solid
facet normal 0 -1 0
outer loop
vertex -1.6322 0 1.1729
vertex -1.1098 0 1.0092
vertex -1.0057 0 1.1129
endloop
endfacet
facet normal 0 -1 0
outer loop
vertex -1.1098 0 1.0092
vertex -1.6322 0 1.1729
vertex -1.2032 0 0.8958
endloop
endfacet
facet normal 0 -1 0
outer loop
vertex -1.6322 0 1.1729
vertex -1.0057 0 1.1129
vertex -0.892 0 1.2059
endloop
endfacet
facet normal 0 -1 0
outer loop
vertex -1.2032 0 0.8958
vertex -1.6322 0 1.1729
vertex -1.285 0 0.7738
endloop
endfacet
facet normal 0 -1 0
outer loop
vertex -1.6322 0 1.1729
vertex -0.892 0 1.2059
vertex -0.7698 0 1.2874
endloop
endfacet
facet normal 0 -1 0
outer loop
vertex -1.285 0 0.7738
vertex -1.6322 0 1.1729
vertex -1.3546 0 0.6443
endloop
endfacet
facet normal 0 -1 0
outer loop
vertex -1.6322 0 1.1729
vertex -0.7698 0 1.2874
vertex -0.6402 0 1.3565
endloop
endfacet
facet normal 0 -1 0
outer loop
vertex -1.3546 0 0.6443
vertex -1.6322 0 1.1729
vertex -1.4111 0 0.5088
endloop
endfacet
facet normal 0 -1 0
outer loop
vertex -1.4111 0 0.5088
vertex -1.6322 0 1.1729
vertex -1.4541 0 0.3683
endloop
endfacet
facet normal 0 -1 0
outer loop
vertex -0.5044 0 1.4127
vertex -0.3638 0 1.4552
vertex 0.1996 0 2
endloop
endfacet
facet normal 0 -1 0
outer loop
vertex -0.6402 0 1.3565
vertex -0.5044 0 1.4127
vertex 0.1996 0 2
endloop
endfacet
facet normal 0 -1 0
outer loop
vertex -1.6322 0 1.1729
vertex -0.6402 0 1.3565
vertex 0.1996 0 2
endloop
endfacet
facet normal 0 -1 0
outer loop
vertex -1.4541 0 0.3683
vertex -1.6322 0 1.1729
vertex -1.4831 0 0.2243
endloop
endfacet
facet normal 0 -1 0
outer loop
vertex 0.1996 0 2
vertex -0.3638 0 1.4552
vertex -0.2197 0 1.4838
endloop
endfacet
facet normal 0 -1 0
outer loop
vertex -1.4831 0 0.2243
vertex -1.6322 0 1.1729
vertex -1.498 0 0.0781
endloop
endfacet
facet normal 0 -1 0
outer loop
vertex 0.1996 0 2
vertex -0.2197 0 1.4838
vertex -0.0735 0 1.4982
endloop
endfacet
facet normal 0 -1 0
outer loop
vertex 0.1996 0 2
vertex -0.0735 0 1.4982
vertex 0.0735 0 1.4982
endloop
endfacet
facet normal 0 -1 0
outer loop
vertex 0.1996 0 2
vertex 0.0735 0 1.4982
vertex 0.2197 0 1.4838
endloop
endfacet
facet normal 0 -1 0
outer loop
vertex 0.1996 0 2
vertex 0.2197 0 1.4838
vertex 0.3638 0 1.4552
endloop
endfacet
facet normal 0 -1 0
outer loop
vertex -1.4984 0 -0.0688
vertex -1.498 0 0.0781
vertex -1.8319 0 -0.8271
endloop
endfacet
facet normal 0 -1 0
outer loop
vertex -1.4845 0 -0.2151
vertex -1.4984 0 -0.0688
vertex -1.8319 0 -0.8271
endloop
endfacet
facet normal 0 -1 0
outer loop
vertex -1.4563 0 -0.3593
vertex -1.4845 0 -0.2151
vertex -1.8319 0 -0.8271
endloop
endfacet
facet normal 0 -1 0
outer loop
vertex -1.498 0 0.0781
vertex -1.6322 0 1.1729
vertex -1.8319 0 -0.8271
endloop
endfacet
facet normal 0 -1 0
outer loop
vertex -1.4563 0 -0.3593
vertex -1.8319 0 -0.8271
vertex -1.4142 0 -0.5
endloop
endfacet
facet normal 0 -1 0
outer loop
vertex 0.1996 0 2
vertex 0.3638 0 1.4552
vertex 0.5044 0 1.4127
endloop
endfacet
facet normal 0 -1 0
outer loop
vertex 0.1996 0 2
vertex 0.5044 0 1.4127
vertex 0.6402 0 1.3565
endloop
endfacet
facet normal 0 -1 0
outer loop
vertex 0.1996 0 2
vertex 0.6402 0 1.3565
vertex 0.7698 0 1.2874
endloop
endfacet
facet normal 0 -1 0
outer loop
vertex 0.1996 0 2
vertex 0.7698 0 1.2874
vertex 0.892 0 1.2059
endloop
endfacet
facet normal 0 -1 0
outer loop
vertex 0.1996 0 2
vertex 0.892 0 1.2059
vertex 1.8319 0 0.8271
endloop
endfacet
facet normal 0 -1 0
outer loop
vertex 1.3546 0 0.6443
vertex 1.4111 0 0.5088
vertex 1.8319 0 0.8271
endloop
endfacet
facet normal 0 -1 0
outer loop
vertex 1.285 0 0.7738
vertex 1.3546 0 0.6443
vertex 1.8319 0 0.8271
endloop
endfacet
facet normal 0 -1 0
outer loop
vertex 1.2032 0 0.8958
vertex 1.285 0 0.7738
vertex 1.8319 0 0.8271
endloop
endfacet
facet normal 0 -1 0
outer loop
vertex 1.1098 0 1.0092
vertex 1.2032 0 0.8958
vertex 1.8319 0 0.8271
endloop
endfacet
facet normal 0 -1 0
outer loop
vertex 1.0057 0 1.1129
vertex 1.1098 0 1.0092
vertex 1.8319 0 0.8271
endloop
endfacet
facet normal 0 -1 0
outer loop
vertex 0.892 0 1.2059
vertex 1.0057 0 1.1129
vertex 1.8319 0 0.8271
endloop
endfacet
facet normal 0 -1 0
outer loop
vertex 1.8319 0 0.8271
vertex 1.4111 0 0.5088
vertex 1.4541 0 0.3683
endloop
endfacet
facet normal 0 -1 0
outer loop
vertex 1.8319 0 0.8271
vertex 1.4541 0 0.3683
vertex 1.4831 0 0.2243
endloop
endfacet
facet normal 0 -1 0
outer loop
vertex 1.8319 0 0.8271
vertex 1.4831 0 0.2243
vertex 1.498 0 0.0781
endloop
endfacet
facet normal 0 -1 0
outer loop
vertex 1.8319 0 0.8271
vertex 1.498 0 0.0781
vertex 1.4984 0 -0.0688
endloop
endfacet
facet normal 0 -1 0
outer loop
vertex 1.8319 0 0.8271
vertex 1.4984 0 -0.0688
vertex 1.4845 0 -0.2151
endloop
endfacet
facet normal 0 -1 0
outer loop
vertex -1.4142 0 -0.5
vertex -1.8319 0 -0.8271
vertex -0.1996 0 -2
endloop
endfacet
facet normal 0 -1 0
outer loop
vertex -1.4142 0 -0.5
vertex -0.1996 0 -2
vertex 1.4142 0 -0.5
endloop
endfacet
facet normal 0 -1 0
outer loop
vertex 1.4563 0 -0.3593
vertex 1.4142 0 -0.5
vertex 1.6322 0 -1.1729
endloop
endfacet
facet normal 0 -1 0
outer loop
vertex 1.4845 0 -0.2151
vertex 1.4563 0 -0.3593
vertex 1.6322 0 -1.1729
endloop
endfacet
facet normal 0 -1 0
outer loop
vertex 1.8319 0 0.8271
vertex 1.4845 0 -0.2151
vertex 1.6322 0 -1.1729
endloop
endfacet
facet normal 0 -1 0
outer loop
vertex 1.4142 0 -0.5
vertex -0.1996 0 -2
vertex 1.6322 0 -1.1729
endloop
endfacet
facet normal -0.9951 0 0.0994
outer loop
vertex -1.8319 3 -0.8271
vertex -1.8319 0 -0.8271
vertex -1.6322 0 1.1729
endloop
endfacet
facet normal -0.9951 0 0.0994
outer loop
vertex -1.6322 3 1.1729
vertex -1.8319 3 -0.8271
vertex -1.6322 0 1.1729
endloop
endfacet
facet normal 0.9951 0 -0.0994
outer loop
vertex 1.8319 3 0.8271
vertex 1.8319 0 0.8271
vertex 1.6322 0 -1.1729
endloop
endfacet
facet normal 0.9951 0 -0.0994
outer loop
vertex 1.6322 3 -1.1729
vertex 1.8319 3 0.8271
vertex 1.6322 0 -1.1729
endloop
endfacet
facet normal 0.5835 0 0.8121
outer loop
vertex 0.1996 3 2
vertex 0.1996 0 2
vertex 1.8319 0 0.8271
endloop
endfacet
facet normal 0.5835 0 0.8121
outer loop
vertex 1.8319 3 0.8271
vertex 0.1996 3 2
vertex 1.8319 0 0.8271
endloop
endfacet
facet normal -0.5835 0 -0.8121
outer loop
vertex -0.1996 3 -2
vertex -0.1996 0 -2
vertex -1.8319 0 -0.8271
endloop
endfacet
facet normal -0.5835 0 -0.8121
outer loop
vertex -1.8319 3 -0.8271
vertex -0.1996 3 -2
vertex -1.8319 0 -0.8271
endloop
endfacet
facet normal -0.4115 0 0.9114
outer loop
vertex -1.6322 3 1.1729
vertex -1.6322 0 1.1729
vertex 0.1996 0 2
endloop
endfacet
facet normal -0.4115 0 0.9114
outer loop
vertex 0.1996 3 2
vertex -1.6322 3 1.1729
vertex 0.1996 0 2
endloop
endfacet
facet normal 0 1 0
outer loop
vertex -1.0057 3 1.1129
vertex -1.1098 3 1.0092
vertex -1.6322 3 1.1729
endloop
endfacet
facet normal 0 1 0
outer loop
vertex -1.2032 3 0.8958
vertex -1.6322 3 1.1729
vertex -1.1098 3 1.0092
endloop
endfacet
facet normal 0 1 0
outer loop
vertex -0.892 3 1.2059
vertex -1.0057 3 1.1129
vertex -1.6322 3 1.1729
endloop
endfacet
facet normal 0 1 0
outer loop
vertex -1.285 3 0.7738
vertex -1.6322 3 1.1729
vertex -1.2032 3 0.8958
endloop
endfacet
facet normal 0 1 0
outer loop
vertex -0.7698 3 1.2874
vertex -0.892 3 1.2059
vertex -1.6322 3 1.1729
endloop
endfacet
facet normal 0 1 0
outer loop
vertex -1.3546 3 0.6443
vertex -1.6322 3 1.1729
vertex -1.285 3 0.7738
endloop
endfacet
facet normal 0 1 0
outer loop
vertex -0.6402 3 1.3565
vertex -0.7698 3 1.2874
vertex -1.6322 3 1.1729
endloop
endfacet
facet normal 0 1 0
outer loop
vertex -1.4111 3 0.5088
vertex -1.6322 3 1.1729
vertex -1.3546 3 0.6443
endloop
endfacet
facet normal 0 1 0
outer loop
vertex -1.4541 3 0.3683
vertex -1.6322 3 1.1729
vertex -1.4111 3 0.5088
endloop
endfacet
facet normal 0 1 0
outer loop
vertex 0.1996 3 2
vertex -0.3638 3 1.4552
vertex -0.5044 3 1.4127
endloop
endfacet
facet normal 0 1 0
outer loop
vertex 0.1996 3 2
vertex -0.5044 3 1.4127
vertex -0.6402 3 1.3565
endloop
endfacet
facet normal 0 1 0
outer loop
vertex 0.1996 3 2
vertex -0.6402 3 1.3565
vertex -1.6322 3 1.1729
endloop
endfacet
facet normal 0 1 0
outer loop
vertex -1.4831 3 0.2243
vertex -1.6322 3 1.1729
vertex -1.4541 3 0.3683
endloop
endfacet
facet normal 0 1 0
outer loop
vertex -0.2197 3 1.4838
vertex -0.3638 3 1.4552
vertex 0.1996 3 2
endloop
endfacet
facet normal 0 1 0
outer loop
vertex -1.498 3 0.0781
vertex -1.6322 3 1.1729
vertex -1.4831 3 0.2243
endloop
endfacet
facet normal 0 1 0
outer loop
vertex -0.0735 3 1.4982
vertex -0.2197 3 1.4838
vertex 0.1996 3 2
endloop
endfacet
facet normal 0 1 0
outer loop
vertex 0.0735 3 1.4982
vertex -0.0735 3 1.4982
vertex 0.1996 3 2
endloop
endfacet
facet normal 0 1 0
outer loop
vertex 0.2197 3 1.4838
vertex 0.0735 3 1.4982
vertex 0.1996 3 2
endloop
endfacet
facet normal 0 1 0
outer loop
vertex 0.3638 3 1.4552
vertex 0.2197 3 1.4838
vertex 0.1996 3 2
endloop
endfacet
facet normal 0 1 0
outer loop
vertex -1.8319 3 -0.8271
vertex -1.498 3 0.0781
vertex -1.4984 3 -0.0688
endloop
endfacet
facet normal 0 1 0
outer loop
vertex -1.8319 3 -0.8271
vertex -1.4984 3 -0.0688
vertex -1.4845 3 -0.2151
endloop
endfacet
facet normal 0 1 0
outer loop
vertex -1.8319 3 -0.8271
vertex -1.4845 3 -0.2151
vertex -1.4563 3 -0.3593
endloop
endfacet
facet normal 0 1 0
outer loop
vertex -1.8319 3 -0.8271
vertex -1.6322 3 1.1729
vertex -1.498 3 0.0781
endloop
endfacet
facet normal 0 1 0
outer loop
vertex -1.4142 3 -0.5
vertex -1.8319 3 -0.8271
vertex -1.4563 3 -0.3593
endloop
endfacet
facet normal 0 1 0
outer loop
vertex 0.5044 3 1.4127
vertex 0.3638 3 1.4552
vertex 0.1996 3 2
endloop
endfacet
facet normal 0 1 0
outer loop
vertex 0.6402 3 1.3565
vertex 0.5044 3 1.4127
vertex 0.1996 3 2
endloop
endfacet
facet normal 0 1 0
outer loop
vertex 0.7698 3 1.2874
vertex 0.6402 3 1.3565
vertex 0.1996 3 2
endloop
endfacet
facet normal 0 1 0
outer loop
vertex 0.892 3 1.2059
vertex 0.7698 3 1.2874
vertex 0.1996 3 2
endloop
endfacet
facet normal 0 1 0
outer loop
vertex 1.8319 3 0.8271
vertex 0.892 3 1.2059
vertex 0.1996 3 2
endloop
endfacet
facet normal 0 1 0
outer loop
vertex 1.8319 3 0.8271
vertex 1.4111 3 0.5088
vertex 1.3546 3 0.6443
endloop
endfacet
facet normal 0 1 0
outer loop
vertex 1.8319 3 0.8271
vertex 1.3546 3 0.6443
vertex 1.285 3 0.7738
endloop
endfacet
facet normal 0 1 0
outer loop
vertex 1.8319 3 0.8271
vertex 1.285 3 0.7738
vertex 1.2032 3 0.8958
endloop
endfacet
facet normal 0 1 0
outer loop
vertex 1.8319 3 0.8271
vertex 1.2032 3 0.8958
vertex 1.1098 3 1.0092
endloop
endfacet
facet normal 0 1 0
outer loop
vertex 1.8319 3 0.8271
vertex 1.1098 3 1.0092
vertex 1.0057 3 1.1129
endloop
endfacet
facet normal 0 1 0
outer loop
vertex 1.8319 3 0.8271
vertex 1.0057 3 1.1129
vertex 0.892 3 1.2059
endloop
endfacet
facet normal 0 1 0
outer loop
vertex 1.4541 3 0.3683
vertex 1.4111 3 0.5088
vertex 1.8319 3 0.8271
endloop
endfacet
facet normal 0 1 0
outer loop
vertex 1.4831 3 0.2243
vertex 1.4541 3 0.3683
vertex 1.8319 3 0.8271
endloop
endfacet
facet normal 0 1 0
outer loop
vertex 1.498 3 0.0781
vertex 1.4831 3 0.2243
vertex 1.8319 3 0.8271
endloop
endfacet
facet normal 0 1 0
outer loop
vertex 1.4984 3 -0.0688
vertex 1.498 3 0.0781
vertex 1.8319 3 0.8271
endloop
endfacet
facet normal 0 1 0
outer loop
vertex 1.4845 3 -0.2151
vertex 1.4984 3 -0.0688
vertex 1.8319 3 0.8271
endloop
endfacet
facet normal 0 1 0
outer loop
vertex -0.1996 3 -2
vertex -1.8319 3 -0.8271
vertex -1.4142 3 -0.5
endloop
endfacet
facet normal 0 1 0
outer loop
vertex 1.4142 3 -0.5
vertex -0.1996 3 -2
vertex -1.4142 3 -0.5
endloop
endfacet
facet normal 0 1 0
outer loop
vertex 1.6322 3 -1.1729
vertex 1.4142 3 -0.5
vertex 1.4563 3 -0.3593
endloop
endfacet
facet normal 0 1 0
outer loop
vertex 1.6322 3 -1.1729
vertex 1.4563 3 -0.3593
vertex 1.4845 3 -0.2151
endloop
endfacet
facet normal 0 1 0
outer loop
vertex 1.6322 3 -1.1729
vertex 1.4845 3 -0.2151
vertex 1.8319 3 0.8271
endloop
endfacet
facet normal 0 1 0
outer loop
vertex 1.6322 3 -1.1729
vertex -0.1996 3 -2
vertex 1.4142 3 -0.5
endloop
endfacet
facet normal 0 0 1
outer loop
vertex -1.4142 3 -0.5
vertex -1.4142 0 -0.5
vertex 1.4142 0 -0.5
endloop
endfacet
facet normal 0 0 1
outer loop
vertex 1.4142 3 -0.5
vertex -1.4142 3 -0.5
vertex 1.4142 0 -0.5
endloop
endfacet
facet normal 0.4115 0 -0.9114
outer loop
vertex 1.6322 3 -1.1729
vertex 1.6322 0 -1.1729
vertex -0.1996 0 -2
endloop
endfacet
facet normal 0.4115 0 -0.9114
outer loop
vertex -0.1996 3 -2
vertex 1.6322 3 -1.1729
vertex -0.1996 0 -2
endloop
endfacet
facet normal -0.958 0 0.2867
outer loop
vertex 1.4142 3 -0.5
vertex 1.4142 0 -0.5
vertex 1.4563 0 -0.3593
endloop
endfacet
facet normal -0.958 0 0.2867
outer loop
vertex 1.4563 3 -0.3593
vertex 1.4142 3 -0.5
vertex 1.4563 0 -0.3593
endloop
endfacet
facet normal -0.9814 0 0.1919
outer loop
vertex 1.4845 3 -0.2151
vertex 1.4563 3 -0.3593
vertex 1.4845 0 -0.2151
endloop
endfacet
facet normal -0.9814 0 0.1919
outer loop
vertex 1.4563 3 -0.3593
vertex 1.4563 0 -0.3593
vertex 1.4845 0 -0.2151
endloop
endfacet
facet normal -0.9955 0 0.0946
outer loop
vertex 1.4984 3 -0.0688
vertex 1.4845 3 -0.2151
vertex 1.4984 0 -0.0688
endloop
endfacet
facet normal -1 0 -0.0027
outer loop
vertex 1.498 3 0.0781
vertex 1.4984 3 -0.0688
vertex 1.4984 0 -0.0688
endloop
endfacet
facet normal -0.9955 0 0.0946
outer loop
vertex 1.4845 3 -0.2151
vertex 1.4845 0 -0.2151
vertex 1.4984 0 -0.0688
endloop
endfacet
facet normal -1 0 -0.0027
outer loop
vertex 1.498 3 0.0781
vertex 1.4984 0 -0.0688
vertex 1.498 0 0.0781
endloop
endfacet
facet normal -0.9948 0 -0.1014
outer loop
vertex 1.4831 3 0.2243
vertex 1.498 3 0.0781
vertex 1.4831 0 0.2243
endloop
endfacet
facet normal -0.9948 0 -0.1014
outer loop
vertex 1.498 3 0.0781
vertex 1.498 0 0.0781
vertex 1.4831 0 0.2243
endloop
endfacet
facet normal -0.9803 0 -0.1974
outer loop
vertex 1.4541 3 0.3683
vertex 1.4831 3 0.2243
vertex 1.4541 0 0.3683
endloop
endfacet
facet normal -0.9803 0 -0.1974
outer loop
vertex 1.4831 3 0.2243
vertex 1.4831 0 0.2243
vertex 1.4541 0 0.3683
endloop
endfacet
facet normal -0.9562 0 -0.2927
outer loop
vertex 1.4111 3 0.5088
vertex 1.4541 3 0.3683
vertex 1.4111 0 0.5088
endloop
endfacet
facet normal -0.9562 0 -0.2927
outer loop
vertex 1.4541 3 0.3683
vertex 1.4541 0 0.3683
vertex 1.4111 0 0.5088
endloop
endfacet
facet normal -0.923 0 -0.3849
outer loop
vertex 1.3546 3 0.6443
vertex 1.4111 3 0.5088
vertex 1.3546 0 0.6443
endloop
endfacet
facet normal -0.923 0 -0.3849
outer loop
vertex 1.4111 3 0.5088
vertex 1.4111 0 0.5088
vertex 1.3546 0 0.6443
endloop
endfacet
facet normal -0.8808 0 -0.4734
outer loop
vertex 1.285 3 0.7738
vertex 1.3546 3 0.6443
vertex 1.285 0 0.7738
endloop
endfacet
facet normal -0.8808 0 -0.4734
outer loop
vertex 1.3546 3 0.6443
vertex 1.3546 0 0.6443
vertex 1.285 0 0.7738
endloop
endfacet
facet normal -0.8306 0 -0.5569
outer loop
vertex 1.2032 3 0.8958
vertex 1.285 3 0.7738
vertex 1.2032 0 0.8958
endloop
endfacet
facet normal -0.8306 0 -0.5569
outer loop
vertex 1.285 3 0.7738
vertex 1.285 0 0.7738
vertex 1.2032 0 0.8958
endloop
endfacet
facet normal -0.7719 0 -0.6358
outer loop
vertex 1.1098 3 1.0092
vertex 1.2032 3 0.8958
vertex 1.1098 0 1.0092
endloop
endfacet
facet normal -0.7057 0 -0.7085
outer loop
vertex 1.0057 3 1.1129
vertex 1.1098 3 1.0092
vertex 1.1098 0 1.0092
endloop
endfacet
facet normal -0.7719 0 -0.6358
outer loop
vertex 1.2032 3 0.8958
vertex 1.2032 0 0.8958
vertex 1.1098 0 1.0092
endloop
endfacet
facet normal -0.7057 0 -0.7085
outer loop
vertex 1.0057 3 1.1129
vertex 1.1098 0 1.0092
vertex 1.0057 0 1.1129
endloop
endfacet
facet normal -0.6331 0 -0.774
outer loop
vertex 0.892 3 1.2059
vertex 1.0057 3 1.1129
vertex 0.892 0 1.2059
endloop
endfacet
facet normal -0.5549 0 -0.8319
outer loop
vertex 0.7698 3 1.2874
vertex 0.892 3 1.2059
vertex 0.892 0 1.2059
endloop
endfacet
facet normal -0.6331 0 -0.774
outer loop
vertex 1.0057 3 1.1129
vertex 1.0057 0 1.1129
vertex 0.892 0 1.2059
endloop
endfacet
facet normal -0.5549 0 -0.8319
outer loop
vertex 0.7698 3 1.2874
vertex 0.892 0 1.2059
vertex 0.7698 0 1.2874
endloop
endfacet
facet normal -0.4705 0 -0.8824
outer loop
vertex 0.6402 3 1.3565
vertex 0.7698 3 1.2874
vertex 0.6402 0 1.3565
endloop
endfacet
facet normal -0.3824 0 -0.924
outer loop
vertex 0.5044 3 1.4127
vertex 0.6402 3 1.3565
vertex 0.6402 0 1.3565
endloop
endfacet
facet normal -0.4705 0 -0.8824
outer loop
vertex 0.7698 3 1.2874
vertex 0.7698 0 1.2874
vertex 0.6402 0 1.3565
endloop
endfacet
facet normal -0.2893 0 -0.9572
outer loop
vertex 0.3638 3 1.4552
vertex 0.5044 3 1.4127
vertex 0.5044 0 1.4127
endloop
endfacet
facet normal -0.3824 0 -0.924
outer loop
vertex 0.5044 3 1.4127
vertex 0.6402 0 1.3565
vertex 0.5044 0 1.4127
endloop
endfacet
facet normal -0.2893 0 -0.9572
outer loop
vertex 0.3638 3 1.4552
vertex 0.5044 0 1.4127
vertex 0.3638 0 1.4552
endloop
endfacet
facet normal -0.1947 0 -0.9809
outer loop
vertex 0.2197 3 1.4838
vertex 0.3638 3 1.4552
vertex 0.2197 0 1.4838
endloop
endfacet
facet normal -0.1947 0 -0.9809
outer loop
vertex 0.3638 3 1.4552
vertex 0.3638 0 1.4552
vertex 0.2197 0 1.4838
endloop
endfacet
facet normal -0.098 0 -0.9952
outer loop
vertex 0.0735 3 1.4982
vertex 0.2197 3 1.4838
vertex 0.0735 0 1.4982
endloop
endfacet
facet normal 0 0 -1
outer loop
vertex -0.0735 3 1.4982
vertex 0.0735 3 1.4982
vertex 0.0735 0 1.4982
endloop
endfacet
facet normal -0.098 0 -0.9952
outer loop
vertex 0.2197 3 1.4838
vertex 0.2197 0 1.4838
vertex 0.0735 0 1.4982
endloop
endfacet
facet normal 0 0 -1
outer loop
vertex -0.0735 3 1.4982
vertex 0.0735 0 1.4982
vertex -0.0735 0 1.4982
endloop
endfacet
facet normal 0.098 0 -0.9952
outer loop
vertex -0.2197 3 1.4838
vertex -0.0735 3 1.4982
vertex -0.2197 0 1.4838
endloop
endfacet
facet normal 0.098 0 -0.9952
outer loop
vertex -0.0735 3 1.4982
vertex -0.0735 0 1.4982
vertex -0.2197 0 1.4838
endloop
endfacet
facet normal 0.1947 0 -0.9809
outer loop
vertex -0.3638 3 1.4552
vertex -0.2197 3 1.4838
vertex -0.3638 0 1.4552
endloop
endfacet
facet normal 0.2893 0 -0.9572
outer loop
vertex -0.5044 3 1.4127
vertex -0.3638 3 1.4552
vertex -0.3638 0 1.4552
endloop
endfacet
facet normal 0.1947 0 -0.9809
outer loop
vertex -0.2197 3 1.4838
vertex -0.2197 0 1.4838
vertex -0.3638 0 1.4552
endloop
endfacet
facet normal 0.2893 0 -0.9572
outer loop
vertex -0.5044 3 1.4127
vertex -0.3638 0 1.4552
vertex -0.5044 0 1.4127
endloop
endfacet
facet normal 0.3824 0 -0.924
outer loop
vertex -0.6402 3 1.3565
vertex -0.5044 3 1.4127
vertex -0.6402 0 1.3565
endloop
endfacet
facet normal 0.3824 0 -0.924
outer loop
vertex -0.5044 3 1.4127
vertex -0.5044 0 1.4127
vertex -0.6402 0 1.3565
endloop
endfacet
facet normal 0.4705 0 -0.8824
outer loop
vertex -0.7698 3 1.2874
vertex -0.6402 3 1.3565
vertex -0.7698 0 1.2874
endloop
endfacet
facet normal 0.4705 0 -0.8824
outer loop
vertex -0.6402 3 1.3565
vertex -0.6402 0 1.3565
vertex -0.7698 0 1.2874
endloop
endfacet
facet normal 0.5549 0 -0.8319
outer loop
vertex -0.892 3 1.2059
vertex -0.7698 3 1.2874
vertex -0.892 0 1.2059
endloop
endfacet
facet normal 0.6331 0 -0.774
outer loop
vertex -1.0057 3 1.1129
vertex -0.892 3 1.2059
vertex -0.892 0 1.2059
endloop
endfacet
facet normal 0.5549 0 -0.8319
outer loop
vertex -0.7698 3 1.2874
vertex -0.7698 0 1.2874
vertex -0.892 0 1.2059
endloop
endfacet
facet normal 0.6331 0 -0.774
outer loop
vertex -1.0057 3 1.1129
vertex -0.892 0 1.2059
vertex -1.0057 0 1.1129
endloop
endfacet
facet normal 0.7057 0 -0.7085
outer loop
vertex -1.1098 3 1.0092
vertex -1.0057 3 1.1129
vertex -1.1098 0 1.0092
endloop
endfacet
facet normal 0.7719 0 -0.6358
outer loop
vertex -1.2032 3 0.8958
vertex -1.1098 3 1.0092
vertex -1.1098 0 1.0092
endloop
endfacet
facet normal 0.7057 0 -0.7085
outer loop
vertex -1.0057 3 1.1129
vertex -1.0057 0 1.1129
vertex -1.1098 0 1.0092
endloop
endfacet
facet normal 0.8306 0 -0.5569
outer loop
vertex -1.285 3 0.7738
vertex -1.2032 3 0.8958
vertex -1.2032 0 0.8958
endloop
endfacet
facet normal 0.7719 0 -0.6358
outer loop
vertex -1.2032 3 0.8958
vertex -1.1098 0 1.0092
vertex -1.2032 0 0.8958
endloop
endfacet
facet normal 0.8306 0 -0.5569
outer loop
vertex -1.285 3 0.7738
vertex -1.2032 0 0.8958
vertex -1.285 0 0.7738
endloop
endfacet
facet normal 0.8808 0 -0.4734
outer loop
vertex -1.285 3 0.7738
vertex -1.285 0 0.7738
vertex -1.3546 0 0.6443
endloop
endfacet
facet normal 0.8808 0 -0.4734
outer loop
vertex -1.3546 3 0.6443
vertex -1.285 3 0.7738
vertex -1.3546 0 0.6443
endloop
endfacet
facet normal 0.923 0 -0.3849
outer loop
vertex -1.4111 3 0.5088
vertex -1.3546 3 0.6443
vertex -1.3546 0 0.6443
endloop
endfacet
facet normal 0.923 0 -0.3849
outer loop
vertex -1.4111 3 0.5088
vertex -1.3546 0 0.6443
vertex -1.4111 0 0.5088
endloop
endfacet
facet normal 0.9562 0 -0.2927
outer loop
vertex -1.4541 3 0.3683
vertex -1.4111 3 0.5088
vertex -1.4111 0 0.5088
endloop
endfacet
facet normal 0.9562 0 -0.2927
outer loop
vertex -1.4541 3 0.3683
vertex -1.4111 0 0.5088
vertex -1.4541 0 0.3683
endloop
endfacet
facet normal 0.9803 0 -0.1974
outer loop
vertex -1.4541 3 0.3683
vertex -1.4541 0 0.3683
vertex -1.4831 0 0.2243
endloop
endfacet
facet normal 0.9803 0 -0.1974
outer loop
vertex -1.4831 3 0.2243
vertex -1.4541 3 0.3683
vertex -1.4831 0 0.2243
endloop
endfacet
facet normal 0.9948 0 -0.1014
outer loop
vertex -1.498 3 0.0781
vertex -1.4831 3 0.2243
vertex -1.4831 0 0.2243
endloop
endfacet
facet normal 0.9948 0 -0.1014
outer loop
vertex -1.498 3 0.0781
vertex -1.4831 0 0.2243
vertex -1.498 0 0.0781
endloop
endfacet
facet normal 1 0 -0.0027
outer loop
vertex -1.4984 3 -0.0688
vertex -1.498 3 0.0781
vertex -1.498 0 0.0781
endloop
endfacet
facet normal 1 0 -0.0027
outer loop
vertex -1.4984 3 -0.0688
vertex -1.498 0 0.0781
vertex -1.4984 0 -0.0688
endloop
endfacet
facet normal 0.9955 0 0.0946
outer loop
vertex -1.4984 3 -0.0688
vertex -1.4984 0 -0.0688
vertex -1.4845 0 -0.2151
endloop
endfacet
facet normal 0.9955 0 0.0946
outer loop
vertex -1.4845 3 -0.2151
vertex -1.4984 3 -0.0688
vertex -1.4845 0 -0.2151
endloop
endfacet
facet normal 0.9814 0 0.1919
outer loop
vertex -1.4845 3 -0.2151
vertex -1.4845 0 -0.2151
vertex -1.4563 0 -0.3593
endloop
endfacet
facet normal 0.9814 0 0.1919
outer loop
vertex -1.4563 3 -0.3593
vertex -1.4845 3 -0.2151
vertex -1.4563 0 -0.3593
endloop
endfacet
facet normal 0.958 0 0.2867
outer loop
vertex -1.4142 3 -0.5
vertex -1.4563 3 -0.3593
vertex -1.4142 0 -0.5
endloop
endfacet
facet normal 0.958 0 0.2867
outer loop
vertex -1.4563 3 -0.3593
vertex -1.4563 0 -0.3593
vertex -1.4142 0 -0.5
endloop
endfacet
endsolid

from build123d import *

# Parameters (mm, degrees)
BOSS_EXTRUDE1_DEPTH = 3


with BuildPart() as part:
    # Sketch1 → Boss-Extrude1 (new body)
    with BuildSketch(Plane(origin=(0, 0, 0), x_dir=(1, 0, 0), z_dir=(0, 1, 0))):
        Polygon((1.83187038, -0.827107429), (1.632231235, 1.172892571), (-0.199639144, 2), (-1.83187038, 0.827107429), (-1.632231235, -1.172892571), (0.199639144, -2), align=None)
        with BuildLine():
            Line((-1.414213562, 0.5), (1.414213562, 0.5))
            ThreePointArc((1.414213562, 0.5), (0, -1.5), (-1.414213562, 0.5))
        make_face(mode=Mode.SUBTRACT)
    extrude(amount=BOSS_EXTRUDE1_DEPTH)


solid = part.part
